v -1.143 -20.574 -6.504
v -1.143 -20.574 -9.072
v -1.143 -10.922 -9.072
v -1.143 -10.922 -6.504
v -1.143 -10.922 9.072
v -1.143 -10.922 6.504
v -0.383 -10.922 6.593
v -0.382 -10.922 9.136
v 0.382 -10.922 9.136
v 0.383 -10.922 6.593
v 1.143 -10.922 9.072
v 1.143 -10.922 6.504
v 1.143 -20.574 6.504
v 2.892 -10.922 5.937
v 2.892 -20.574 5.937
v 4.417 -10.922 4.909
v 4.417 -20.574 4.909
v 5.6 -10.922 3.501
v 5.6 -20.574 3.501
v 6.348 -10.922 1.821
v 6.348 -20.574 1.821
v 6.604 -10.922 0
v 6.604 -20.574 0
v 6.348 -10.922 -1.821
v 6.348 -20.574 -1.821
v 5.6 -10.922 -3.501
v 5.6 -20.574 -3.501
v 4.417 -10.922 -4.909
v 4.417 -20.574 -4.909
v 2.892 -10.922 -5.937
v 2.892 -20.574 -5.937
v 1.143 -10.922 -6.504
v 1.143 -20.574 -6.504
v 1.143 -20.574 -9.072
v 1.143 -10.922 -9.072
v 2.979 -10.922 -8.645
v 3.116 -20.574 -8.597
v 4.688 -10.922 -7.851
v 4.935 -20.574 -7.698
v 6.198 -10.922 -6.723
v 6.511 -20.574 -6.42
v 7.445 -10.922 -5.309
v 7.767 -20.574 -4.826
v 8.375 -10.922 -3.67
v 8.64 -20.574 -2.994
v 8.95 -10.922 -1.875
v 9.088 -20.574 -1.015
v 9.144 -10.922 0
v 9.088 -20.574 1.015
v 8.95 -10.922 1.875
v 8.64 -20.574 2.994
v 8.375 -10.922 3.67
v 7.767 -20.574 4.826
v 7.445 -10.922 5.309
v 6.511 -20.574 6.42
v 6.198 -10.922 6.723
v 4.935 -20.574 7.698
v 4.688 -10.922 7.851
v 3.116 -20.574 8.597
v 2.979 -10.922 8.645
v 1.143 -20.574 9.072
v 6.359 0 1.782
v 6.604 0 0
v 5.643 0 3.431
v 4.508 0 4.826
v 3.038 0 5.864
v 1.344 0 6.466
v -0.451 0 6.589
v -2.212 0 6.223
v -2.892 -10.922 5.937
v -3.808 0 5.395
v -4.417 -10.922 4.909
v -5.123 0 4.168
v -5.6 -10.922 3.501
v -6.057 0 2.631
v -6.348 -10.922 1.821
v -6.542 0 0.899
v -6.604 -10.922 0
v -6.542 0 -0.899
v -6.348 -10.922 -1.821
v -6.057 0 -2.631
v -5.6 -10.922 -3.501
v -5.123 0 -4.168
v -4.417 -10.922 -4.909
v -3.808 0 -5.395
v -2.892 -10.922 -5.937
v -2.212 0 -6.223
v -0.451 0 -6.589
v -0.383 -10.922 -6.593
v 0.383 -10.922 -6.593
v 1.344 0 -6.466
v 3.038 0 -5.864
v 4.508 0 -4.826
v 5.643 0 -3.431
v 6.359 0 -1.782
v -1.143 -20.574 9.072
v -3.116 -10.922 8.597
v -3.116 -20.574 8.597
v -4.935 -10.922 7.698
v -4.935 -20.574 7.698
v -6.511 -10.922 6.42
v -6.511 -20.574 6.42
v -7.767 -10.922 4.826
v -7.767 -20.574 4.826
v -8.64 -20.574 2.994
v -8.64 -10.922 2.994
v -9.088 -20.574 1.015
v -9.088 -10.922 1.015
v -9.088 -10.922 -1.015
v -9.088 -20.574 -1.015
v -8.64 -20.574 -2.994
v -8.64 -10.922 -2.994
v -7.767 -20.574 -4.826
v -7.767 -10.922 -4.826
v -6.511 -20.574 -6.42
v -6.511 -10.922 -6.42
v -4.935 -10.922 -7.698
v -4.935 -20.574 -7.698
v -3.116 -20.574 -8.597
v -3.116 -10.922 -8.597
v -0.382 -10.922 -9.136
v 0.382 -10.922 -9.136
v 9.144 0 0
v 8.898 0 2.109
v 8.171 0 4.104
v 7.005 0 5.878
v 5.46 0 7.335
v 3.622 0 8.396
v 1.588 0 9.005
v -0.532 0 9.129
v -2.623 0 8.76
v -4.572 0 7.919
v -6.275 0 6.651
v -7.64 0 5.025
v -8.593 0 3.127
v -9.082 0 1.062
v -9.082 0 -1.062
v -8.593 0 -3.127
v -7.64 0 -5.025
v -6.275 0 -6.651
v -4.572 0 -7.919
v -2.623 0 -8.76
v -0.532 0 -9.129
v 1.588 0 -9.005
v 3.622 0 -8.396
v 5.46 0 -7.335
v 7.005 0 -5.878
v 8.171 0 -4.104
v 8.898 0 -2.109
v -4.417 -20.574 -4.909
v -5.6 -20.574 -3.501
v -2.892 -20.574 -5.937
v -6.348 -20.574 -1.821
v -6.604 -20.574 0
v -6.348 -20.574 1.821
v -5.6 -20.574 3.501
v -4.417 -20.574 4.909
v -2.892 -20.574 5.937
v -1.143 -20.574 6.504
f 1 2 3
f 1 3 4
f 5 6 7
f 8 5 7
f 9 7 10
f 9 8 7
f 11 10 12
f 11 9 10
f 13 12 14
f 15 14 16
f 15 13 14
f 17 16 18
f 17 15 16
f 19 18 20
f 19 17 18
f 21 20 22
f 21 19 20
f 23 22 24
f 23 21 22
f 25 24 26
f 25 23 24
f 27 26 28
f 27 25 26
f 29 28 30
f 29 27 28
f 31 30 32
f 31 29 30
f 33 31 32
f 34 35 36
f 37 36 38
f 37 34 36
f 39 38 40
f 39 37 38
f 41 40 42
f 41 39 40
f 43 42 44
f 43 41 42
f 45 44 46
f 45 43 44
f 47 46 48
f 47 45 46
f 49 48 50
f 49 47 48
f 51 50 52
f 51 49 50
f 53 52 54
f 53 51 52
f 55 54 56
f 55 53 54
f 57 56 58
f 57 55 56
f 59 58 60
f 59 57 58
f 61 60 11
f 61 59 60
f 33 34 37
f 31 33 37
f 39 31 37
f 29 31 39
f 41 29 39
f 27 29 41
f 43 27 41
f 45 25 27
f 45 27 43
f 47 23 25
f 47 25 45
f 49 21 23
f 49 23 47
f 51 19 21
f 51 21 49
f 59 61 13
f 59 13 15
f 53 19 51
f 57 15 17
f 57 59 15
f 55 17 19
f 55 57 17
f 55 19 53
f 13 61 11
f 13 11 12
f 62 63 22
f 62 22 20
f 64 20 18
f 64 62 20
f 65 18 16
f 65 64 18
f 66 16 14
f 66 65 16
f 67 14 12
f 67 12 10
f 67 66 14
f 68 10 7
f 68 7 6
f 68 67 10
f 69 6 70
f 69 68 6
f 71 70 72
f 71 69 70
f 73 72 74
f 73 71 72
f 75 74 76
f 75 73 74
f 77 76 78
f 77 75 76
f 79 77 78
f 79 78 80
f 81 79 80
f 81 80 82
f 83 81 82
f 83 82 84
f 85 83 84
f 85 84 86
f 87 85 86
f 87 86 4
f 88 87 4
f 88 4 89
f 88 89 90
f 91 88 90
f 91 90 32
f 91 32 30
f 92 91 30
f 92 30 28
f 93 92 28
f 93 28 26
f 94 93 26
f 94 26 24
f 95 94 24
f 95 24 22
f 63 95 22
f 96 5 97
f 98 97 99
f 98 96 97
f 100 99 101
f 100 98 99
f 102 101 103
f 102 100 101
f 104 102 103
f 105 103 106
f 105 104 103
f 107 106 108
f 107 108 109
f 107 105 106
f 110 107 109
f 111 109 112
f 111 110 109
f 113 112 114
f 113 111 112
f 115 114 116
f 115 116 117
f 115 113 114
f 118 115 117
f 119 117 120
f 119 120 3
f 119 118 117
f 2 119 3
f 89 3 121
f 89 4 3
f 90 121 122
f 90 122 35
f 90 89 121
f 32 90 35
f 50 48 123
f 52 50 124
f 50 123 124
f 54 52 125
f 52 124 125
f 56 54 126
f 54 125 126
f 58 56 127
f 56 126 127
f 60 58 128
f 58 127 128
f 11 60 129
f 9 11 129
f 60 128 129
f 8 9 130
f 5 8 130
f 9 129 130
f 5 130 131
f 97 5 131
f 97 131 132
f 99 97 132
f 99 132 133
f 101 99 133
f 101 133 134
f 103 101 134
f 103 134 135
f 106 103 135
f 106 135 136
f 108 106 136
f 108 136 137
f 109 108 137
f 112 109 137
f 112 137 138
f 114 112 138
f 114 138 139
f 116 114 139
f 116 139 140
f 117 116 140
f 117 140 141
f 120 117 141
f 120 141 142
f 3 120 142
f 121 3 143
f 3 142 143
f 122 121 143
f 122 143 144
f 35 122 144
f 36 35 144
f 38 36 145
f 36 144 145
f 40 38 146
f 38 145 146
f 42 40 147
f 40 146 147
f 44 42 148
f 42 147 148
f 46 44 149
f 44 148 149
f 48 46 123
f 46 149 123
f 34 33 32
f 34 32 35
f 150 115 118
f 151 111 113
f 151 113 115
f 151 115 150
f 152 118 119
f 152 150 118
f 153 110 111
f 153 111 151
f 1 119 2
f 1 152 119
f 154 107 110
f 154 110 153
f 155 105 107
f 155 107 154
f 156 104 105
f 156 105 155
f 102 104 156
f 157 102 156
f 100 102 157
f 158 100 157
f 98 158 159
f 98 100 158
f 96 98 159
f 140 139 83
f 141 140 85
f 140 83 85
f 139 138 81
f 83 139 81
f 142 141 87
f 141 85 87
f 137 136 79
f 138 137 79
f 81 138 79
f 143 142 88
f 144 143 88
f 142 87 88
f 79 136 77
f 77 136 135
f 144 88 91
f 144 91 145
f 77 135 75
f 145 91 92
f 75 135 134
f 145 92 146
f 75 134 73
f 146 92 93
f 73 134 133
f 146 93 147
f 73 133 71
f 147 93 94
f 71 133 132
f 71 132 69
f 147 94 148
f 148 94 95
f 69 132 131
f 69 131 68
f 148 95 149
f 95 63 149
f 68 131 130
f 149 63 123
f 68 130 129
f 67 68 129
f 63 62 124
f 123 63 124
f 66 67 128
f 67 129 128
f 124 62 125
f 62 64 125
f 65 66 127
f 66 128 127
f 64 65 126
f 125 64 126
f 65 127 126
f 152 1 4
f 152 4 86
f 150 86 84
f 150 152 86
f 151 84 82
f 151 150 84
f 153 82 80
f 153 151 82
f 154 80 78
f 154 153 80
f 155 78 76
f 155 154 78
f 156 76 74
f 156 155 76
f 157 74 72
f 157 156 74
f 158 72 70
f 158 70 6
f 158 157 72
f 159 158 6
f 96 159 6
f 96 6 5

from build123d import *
from build123d import SkipClean  # not in build123d's __all__

# Parameters (mm, degrees)
F0_R     = 9.144
F0_R_2   = 6.604
F1_DEPTH = 10.922
F4_DEPTH = 9.652


with BuildPart() as f1:
    # F0 (on Front) → F1 (new body)
    with BuildSketch(Plane.XZ):
        Circle(F0_R)
        Circle(F0_R_2, mode=Mode.SUBTRACT)
    extrude(amount=F1_DEPTH)

    # F3 (on offset) → F4 (join)
    with BuildSketch(Plane.XZ.offset(20.574)):
        with BuildLine():
            Line((-1.143, 6.5043344779), (-1.143, 9.0722812456))
            ThreePointArc((-1.143, 9.0722812456), (-9.144, 0), (-1.143, -9.0722812456))
            Line((-1.143, -9.0722812456), (-1.143, -6.5043344779))
            ThreePointArc((-1.143, -6.5043344779), (-6.604, 0), (-1.143, 6.5043344779))
        make_face()
        with BuildLine():
            ThreePointArc((1.143, -9.0722812456), (9.144, 0), (1.143, 9.0722812456))
            Line((1.143, 9.0722812456), (1.143, 6.5043344779))
            ThreePointArc((1.143, 6.5043344779), (6.604, 0), (1.143, -6.5043344779))
            Line((1.143, -6.5043344779), (1.143, -9.0722812456))
        make_face()
    with SkipClean():  # cleaning this boolean's faces spoils the solid; the shape is the same uncleaned
        extrude(amount=-F4_DEPTH)


solid = f1.part
